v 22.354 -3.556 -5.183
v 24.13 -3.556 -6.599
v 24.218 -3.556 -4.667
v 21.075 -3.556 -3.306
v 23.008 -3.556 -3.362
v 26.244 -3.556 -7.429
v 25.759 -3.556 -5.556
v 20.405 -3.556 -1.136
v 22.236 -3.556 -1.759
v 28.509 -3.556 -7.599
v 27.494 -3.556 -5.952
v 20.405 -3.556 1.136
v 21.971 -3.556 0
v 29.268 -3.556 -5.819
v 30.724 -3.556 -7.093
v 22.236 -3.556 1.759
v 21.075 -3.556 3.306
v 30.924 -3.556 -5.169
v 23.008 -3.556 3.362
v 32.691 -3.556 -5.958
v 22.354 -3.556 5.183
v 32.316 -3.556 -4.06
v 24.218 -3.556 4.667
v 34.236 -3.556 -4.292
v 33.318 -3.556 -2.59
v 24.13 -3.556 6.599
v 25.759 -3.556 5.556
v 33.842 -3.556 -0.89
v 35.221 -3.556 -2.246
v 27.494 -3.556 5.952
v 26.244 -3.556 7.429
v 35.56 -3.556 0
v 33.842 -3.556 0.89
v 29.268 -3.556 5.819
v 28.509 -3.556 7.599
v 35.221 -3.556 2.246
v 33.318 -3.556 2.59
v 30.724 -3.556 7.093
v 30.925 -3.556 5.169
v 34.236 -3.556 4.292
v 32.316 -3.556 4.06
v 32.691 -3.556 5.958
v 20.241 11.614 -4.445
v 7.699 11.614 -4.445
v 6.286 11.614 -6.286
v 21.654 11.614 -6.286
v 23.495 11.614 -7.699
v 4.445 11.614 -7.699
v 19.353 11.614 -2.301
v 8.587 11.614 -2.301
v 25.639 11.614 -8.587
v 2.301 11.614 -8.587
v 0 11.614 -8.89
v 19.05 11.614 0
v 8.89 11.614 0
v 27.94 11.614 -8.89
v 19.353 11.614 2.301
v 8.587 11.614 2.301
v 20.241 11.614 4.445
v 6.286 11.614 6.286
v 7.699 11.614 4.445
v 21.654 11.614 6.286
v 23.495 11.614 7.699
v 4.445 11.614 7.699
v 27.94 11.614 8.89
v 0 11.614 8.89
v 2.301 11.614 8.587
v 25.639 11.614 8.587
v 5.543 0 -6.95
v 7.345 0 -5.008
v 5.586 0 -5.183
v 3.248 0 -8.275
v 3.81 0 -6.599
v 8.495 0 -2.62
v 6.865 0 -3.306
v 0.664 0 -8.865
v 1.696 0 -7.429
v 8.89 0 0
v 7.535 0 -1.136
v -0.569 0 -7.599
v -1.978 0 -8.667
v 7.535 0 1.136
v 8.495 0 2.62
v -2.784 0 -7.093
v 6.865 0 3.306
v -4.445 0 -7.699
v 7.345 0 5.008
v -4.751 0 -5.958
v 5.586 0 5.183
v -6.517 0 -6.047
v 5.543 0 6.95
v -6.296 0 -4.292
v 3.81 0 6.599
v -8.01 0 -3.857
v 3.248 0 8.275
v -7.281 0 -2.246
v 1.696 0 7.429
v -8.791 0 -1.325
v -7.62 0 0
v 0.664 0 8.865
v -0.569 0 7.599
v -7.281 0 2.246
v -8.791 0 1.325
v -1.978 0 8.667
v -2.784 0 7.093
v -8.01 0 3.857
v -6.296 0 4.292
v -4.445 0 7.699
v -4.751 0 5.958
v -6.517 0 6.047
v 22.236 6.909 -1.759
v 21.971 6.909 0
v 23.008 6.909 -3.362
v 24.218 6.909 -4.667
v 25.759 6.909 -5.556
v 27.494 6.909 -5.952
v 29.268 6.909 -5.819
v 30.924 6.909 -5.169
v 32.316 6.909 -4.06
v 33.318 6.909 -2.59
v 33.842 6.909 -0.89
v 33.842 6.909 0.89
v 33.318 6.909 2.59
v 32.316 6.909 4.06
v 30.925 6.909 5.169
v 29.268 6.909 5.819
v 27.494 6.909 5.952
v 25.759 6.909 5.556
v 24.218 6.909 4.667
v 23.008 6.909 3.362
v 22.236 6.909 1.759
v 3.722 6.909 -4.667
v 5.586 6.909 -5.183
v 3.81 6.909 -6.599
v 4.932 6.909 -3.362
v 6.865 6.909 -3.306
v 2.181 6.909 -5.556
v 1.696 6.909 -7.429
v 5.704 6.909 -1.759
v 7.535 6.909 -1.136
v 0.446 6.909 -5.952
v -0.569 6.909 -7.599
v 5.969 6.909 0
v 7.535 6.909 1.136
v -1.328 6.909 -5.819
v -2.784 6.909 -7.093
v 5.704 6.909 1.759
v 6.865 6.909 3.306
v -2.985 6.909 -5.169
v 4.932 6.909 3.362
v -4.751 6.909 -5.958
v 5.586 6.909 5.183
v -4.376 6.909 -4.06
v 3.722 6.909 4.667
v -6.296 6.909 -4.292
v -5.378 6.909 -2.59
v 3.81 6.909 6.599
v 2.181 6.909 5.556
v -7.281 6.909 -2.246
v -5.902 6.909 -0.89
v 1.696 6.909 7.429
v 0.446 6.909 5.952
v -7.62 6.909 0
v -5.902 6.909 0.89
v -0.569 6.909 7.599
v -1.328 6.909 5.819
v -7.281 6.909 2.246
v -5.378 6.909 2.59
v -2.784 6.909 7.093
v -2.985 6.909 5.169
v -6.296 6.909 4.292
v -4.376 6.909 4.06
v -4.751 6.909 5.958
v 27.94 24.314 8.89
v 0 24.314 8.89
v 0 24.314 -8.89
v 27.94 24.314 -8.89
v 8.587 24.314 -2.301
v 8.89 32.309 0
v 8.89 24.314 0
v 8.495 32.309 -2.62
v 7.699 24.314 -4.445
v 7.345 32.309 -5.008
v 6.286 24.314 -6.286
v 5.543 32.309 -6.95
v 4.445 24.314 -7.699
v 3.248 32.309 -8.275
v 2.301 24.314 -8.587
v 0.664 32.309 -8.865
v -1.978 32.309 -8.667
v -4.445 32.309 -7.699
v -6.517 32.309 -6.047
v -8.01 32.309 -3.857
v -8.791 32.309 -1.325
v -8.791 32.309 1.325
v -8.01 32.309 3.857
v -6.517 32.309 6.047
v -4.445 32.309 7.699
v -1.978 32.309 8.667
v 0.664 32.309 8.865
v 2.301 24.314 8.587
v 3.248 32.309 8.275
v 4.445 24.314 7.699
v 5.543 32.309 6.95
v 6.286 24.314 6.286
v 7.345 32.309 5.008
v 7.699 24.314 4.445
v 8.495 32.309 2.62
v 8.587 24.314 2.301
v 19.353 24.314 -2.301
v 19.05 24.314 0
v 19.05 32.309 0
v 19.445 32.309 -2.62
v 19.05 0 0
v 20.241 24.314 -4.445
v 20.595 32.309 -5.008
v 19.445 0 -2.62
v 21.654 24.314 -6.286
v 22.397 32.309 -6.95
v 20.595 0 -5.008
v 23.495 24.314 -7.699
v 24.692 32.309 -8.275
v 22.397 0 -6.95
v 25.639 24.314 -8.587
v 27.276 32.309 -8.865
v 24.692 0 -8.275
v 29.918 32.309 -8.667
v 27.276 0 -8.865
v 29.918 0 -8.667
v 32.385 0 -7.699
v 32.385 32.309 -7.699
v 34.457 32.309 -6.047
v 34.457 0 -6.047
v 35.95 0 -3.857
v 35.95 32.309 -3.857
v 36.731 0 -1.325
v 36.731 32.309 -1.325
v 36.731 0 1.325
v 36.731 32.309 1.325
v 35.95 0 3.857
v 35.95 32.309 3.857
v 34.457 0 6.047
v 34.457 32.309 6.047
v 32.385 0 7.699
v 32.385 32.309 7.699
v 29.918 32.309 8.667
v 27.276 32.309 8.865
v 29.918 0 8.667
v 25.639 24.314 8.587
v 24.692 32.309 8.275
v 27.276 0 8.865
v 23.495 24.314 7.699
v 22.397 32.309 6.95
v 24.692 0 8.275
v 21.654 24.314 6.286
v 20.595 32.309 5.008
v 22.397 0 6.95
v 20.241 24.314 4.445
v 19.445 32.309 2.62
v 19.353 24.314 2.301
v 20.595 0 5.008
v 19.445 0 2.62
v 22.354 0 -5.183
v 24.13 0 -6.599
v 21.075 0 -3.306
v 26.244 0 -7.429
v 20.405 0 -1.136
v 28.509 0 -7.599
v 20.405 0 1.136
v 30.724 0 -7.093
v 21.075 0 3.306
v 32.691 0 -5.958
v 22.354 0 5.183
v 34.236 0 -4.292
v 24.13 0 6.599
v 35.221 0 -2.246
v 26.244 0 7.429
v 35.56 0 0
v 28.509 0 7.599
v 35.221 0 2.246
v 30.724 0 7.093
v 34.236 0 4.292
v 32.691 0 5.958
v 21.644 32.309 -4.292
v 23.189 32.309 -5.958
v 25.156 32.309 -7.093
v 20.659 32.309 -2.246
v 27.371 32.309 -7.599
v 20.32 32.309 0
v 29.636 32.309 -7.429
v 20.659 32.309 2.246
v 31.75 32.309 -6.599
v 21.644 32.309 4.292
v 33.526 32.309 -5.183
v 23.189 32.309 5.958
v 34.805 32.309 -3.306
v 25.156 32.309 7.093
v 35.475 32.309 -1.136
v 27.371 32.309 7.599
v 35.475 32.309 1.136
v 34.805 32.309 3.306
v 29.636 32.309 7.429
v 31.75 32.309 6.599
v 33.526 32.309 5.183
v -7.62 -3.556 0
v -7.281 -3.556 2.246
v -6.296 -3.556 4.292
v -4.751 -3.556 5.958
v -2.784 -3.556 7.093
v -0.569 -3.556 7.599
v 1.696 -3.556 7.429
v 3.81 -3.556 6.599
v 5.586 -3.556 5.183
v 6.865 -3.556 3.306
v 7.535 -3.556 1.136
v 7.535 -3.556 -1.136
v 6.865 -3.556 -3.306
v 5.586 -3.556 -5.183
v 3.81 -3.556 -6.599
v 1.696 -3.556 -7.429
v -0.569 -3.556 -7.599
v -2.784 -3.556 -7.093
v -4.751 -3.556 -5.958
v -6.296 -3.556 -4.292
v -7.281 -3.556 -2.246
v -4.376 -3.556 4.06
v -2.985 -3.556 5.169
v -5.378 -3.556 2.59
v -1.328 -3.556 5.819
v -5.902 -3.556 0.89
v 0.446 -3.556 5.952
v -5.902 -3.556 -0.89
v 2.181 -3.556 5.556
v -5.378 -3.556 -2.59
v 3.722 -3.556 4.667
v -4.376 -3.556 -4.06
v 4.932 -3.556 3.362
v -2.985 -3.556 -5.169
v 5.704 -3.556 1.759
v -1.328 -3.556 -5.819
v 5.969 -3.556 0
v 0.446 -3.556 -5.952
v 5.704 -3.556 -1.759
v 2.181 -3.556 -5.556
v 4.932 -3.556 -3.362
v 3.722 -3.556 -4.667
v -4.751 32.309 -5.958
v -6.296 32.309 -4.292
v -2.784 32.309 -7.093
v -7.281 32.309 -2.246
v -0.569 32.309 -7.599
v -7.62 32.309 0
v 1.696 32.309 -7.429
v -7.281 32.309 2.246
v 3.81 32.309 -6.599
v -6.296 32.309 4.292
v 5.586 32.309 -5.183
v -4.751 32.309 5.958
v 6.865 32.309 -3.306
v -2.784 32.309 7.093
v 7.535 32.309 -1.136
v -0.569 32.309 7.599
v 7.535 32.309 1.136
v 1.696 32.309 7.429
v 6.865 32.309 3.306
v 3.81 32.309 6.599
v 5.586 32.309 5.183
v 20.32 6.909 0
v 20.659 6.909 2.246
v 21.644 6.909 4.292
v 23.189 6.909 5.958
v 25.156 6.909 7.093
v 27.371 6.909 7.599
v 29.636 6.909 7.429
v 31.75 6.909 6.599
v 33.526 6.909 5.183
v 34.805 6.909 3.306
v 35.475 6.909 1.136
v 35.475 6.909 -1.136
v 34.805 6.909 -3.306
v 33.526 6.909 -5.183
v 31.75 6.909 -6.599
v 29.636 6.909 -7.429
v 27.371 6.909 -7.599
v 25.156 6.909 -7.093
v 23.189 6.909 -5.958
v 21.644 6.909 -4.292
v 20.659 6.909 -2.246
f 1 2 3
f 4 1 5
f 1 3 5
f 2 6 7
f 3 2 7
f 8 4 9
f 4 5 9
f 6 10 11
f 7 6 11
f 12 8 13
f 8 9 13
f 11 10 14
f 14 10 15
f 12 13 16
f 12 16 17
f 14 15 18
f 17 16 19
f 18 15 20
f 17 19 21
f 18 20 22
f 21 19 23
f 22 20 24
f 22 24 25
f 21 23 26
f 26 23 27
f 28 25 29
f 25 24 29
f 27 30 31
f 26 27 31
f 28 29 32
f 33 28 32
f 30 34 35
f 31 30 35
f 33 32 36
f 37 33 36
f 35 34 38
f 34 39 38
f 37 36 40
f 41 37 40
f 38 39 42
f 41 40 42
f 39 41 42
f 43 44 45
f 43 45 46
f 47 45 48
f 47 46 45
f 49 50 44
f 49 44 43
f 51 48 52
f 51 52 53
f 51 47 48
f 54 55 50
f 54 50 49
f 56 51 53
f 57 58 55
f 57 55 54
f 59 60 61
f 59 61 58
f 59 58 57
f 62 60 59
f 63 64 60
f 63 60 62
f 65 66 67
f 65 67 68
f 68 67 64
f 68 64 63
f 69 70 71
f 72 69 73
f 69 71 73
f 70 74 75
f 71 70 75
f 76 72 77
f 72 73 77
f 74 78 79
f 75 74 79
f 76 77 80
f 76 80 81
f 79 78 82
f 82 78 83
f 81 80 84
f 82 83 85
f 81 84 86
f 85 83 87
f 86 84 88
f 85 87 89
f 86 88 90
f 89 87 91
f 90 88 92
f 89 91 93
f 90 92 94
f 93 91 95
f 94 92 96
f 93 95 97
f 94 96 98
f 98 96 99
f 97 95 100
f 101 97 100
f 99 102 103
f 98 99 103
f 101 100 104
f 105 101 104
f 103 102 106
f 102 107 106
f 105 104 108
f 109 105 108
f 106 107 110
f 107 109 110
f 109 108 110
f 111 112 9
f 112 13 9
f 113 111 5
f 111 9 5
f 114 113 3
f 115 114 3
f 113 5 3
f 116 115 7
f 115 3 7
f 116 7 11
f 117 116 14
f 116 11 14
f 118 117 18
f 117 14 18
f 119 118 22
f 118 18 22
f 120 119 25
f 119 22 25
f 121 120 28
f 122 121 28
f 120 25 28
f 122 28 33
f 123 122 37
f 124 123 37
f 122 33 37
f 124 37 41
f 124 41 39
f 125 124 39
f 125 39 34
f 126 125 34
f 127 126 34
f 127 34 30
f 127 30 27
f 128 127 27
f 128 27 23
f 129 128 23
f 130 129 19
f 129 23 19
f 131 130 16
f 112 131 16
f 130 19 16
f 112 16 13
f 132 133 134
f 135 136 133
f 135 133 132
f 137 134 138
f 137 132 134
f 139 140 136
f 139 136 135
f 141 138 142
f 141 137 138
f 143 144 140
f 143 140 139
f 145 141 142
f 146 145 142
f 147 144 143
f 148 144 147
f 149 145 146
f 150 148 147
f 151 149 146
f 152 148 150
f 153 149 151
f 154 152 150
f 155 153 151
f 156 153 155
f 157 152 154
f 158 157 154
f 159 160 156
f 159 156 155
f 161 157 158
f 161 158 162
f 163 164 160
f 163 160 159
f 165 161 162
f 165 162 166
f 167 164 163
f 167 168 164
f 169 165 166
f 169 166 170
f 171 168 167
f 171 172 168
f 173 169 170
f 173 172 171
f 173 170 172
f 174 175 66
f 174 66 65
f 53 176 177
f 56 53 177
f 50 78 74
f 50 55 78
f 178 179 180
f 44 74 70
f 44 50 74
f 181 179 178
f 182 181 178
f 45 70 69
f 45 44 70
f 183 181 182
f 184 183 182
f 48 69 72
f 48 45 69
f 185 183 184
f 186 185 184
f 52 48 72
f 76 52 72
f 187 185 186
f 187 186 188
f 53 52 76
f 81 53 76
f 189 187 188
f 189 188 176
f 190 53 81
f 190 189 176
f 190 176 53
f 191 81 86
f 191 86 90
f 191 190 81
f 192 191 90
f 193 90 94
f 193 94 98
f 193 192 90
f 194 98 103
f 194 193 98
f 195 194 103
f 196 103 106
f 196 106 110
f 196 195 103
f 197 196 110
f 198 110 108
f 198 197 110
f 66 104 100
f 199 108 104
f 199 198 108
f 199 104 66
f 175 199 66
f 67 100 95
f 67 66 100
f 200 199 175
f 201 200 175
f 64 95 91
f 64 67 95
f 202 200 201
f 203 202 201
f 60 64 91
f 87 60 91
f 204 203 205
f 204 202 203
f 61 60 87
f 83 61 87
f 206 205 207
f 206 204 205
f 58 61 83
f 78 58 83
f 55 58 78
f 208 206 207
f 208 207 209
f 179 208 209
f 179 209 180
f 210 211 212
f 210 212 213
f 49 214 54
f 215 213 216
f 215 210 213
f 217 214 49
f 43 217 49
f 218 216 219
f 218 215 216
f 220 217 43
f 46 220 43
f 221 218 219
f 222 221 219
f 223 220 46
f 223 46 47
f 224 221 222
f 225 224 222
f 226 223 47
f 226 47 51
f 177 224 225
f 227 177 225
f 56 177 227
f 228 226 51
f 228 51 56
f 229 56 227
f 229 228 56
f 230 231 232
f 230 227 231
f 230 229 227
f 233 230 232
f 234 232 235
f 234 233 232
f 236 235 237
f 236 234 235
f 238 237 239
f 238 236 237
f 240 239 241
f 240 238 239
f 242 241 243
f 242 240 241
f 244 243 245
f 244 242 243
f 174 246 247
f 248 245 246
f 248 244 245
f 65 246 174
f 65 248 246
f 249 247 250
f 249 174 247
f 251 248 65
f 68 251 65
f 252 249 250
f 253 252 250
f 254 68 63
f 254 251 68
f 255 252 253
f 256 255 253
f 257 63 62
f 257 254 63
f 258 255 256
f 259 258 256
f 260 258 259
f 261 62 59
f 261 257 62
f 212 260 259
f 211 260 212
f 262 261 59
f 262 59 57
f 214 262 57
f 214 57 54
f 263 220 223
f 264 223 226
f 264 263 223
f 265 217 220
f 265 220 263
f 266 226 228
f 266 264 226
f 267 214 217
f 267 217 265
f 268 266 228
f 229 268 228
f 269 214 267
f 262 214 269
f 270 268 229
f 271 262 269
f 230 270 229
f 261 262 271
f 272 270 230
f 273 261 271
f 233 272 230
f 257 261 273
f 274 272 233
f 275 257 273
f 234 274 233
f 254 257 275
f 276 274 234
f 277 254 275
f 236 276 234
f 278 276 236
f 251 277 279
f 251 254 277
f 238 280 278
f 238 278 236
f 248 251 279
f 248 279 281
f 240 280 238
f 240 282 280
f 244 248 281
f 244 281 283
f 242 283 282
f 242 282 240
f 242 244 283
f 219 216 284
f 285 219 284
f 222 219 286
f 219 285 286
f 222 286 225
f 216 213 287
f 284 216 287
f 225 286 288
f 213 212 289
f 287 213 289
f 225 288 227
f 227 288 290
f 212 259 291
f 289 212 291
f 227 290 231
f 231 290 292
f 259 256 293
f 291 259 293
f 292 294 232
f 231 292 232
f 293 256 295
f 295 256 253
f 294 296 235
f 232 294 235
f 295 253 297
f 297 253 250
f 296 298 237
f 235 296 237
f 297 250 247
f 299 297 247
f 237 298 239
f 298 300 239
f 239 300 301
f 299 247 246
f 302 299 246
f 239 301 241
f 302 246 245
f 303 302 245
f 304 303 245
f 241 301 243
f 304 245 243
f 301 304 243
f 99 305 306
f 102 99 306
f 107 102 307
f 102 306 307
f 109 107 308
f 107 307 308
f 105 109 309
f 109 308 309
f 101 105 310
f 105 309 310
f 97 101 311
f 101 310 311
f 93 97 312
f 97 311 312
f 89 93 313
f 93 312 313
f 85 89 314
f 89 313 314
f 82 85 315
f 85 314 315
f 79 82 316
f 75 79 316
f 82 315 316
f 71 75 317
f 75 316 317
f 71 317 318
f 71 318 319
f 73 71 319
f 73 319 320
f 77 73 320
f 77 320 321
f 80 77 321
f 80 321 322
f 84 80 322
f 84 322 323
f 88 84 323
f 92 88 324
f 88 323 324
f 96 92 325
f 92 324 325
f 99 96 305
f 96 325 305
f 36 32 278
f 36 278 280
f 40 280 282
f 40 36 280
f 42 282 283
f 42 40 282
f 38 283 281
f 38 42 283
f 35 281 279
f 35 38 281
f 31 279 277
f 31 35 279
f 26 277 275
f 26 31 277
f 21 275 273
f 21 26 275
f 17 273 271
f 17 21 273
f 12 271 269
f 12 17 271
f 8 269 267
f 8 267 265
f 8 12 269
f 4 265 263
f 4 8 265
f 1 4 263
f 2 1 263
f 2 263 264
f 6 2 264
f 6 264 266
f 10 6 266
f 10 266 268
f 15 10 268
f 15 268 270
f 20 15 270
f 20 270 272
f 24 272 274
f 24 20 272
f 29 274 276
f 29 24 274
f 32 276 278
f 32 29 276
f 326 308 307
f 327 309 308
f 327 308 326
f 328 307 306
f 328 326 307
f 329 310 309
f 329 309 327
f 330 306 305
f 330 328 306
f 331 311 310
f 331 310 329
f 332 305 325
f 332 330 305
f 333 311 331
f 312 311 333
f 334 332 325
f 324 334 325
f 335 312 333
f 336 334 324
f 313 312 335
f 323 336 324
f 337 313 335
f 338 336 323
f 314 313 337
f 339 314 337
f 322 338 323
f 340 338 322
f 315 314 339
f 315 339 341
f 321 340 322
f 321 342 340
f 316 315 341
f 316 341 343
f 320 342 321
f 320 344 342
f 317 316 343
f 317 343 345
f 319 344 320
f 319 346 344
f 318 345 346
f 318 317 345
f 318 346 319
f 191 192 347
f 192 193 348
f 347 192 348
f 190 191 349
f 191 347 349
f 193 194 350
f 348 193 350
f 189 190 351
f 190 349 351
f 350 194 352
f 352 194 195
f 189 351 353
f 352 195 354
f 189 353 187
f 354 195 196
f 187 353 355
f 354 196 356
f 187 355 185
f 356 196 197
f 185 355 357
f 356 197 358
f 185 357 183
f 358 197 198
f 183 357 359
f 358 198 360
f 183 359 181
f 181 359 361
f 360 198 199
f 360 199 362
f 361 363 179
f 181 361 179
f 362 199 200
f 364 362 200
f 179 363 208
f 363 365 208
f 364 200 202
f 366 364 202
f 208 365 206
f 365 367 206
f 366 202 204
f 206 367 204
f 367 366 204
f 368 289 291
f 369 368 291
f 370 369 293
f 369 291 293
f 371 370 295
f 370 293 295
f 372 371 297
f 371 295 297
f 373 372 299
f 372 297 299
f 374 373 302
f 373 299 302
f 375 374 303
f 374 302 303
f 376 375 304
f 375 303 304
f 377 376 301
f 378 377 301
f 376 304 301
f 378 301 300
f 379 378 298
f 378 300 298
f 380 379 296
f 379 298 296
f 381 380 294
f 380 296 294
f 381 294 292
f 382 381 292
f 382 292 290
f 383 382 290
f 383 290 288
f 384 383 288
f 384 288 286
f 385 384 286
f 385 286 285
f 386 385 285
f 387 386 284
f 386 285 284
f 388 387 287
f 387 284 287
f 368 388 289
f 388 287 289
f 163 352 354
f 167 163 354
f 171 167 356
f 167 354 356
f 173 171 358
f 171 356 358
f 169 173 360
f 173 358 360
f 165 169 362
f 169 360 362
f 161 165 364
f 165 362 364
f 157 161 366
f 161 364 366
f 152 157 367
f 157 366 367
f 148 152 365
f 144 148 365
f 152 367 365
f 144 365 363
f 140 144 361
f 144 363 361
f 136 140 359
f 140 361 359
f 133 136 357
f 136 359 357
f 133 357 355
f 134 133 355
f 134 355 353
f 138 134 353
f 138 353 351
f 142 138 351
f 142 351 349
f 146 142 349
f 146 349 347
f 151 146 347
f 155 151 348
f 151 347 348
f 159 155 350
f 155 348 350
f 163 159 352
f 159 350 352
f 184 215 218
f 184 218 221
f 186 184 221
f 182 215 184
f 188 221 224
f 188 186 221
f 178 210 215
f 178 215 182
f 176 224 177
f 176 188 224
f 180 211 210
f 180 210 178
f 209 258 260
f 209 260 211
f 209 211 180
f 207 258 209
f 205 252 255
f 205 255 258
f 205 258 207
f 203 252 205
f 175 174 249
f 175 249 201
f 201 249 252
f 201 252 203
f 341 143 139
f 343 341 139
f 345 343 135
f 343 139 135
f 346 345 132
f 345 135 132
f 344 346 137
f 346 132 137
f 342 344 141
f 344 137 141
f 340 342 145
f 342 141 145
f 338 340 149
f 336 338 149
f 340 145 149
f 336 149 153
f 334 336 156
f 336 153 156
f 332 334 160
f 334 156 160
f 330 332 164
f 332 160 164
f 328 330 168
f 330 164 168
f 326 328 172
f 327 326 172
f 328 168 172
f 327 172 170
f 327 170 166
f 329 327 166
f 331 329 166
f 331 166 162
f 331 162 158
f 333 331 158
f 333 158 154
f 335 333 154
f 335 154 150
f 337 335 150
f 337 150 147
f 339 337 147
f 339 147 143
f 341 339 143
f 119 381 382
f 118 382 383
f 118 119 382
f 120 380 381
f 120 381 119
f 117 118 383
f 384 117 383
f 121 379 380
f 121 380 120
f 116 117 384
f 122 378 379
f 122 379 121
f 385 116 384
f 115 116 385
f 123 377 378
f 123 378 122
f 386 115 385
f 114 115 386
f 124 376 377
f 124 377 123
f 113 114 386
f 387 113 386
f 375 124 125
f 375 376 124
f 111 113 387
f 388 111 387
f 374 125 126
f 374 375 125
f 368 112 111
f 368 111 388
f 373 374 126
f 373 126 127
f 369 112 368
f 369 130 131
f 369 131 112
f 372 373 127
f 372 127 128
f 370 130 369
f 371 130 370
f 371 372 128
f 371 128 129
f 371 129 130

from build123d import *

# Parameters (mm, degrees)
F1_R           = 8.89
F1_R_2         = 5.969
F3_DEPTH       = 3.556
F5_R           = 8.89
F5_R_2         = 7.62
F7_DEPTH       = 3.556
F8_DEPTH       = 25.4
F8_DEPTH_BACK  = 25.4
F0_W           = 10.282781499
F0_H           = 12.7
F0_W_2         = 17.657218501
F11_DEPTH      = 8.89
F11_DEPTH_BACK = 8.89
F9_R           = 7.62
F10_R          = 7.62
F12_DEPTH      = 25.4


# Not quite as in the source:
# - a feature of the source that left no trace in its solid (it failed there, or was rolled back) is left out
# - a pattern or mirror of a feature is missing from the dataset's text; its kind, count and spacing are read off the source's solid


with BuildPart() as f2:
    # F2: sweep along a path in F0
    with BuildLine(Plane.XY) as f2_path:
        Line((0, 0), (0, 70.4088))
        ThreePointArc((0, 70.4088), (13.97, 84.3788), (27.94, 70.4088))
        Line((27.94, 70.4088), (27.94, 0))
        Line((27.94, 0), (27.94, -3.556))
    # F1 (on Front) → F2 (sweep)
    with BuildSketch(Plane.XZ):
        Circle(F1_R)
        Circle(F1_R_2, mode=Mode.SUBTRACT)
    sweep(path=f2_path.line)

    # F3 (add): a face of the model
    f3_faces = [f2.faces().sort_by_distance(p)[0] for p in [
        (-8.6385528286, 0, 0),
    ]]
    extrude(f3_faces, amount=F3_DEPTH)

    # F5 (on face) → F7 (cut)
    with BuildSketch(Plane.XZ.offset(3.556)):
        with Locations((27.94, 0)):
            Circle(F5_R)
        with Locations((27.94, 0)):
            Circle(F5_R_2, mode=Mode.SUBTRACT)
    f7 = extrude(amount=-F7_DEPTH, mode=Mode.SUBTRACT)

    # F7_copies: F7 across plane
    add(f7.mirror(Plane(origin=(13.97, 0, 0), x_dir=(0, 0, -1), z_dir=(-1, 0, 0))), mode=Mode.SUBTRACT)

    # F0 (on Top) → F8 (cut, two sides)
    with BuildSketch(Plane.XY) as f8_sk:
        with BuildLine():
            Line((-21.5208670124, 32.3088), (0, 32.3088))
            Line((0, 32.3088), (0, 70.4088))
            ThreePointArc((0, 70.4088), (13.97, 84.3788), (27.94, 70.4088))
            Line((27.94, 70.4088), (27.94, 32.3088))
            Line((27.94, 32.3088), (57.1982562542, 32.3088))
            Line((57.1982562542, 32.3088), (57.1982562542, 105.6616994024))
            Line((57.1982562542, 105.6616994024), (-21.5208670124, 105.6616994024))
            Line((-21.5208670124, 105.6616994024), (-21.5208670124, 32.3088))
        make_face()
        with BuildLine():
            Line((0, 70.4088), (0, 32.3088))
            Line((0, 32.3088), (13.97, 32.3088))
            Line((13.97, 32.3088), (27.94, 32.3088))
            Line((27.94, 32.3088), (27.94, 70.4088))
            ThreePointArc((27.94, 70.4088), (13.97, 84.3788), (0, 70.4088))
        make_face()
    extrude(amount=-F8_DEPTH, mode=Mode.SUBTRACT)
    extrude(f8_sk.sketch, amount=F8_DEPTH_BACK, mode=Mode.SUBTRACT)

    # F0 (on Top) → F11 (join, two sides)
    with BuildSketch(Plane.XY) as f11_sk:
        with Locations((22.7986092505, 17.9638495505)):
            Rectangle(F0_W, F0_H)
        with Locations((8.8286092505, 17.9638495505)):
            Rectangle(F0_W_2, F0_H)
    extrude(amount=F11_DEPTH)
    extrude(f11_sk.sketch, amount=-F11_DEPTH_BACK)

    # F9 (on face) + F10 (on face) → F12 (cut)
    with BuildSketch(Plane(origin=(0, 32.3088, 0), x_dir=(-1, 0, 0), z_dir=(0, 1, 0))):
        with Locations((-27.94, 0)):
            Circle(F9_R)
    with BuildSketch(Plane(origin=(0, 32.3088, 0), x_dir=(-1, 0, 0), z_dir=(0, 1, 0))):
        Circle(F10_R)
    extrude(amount=-F12_DEPTH, mode=Mode.SUBTRACT)


solid = f2.part
